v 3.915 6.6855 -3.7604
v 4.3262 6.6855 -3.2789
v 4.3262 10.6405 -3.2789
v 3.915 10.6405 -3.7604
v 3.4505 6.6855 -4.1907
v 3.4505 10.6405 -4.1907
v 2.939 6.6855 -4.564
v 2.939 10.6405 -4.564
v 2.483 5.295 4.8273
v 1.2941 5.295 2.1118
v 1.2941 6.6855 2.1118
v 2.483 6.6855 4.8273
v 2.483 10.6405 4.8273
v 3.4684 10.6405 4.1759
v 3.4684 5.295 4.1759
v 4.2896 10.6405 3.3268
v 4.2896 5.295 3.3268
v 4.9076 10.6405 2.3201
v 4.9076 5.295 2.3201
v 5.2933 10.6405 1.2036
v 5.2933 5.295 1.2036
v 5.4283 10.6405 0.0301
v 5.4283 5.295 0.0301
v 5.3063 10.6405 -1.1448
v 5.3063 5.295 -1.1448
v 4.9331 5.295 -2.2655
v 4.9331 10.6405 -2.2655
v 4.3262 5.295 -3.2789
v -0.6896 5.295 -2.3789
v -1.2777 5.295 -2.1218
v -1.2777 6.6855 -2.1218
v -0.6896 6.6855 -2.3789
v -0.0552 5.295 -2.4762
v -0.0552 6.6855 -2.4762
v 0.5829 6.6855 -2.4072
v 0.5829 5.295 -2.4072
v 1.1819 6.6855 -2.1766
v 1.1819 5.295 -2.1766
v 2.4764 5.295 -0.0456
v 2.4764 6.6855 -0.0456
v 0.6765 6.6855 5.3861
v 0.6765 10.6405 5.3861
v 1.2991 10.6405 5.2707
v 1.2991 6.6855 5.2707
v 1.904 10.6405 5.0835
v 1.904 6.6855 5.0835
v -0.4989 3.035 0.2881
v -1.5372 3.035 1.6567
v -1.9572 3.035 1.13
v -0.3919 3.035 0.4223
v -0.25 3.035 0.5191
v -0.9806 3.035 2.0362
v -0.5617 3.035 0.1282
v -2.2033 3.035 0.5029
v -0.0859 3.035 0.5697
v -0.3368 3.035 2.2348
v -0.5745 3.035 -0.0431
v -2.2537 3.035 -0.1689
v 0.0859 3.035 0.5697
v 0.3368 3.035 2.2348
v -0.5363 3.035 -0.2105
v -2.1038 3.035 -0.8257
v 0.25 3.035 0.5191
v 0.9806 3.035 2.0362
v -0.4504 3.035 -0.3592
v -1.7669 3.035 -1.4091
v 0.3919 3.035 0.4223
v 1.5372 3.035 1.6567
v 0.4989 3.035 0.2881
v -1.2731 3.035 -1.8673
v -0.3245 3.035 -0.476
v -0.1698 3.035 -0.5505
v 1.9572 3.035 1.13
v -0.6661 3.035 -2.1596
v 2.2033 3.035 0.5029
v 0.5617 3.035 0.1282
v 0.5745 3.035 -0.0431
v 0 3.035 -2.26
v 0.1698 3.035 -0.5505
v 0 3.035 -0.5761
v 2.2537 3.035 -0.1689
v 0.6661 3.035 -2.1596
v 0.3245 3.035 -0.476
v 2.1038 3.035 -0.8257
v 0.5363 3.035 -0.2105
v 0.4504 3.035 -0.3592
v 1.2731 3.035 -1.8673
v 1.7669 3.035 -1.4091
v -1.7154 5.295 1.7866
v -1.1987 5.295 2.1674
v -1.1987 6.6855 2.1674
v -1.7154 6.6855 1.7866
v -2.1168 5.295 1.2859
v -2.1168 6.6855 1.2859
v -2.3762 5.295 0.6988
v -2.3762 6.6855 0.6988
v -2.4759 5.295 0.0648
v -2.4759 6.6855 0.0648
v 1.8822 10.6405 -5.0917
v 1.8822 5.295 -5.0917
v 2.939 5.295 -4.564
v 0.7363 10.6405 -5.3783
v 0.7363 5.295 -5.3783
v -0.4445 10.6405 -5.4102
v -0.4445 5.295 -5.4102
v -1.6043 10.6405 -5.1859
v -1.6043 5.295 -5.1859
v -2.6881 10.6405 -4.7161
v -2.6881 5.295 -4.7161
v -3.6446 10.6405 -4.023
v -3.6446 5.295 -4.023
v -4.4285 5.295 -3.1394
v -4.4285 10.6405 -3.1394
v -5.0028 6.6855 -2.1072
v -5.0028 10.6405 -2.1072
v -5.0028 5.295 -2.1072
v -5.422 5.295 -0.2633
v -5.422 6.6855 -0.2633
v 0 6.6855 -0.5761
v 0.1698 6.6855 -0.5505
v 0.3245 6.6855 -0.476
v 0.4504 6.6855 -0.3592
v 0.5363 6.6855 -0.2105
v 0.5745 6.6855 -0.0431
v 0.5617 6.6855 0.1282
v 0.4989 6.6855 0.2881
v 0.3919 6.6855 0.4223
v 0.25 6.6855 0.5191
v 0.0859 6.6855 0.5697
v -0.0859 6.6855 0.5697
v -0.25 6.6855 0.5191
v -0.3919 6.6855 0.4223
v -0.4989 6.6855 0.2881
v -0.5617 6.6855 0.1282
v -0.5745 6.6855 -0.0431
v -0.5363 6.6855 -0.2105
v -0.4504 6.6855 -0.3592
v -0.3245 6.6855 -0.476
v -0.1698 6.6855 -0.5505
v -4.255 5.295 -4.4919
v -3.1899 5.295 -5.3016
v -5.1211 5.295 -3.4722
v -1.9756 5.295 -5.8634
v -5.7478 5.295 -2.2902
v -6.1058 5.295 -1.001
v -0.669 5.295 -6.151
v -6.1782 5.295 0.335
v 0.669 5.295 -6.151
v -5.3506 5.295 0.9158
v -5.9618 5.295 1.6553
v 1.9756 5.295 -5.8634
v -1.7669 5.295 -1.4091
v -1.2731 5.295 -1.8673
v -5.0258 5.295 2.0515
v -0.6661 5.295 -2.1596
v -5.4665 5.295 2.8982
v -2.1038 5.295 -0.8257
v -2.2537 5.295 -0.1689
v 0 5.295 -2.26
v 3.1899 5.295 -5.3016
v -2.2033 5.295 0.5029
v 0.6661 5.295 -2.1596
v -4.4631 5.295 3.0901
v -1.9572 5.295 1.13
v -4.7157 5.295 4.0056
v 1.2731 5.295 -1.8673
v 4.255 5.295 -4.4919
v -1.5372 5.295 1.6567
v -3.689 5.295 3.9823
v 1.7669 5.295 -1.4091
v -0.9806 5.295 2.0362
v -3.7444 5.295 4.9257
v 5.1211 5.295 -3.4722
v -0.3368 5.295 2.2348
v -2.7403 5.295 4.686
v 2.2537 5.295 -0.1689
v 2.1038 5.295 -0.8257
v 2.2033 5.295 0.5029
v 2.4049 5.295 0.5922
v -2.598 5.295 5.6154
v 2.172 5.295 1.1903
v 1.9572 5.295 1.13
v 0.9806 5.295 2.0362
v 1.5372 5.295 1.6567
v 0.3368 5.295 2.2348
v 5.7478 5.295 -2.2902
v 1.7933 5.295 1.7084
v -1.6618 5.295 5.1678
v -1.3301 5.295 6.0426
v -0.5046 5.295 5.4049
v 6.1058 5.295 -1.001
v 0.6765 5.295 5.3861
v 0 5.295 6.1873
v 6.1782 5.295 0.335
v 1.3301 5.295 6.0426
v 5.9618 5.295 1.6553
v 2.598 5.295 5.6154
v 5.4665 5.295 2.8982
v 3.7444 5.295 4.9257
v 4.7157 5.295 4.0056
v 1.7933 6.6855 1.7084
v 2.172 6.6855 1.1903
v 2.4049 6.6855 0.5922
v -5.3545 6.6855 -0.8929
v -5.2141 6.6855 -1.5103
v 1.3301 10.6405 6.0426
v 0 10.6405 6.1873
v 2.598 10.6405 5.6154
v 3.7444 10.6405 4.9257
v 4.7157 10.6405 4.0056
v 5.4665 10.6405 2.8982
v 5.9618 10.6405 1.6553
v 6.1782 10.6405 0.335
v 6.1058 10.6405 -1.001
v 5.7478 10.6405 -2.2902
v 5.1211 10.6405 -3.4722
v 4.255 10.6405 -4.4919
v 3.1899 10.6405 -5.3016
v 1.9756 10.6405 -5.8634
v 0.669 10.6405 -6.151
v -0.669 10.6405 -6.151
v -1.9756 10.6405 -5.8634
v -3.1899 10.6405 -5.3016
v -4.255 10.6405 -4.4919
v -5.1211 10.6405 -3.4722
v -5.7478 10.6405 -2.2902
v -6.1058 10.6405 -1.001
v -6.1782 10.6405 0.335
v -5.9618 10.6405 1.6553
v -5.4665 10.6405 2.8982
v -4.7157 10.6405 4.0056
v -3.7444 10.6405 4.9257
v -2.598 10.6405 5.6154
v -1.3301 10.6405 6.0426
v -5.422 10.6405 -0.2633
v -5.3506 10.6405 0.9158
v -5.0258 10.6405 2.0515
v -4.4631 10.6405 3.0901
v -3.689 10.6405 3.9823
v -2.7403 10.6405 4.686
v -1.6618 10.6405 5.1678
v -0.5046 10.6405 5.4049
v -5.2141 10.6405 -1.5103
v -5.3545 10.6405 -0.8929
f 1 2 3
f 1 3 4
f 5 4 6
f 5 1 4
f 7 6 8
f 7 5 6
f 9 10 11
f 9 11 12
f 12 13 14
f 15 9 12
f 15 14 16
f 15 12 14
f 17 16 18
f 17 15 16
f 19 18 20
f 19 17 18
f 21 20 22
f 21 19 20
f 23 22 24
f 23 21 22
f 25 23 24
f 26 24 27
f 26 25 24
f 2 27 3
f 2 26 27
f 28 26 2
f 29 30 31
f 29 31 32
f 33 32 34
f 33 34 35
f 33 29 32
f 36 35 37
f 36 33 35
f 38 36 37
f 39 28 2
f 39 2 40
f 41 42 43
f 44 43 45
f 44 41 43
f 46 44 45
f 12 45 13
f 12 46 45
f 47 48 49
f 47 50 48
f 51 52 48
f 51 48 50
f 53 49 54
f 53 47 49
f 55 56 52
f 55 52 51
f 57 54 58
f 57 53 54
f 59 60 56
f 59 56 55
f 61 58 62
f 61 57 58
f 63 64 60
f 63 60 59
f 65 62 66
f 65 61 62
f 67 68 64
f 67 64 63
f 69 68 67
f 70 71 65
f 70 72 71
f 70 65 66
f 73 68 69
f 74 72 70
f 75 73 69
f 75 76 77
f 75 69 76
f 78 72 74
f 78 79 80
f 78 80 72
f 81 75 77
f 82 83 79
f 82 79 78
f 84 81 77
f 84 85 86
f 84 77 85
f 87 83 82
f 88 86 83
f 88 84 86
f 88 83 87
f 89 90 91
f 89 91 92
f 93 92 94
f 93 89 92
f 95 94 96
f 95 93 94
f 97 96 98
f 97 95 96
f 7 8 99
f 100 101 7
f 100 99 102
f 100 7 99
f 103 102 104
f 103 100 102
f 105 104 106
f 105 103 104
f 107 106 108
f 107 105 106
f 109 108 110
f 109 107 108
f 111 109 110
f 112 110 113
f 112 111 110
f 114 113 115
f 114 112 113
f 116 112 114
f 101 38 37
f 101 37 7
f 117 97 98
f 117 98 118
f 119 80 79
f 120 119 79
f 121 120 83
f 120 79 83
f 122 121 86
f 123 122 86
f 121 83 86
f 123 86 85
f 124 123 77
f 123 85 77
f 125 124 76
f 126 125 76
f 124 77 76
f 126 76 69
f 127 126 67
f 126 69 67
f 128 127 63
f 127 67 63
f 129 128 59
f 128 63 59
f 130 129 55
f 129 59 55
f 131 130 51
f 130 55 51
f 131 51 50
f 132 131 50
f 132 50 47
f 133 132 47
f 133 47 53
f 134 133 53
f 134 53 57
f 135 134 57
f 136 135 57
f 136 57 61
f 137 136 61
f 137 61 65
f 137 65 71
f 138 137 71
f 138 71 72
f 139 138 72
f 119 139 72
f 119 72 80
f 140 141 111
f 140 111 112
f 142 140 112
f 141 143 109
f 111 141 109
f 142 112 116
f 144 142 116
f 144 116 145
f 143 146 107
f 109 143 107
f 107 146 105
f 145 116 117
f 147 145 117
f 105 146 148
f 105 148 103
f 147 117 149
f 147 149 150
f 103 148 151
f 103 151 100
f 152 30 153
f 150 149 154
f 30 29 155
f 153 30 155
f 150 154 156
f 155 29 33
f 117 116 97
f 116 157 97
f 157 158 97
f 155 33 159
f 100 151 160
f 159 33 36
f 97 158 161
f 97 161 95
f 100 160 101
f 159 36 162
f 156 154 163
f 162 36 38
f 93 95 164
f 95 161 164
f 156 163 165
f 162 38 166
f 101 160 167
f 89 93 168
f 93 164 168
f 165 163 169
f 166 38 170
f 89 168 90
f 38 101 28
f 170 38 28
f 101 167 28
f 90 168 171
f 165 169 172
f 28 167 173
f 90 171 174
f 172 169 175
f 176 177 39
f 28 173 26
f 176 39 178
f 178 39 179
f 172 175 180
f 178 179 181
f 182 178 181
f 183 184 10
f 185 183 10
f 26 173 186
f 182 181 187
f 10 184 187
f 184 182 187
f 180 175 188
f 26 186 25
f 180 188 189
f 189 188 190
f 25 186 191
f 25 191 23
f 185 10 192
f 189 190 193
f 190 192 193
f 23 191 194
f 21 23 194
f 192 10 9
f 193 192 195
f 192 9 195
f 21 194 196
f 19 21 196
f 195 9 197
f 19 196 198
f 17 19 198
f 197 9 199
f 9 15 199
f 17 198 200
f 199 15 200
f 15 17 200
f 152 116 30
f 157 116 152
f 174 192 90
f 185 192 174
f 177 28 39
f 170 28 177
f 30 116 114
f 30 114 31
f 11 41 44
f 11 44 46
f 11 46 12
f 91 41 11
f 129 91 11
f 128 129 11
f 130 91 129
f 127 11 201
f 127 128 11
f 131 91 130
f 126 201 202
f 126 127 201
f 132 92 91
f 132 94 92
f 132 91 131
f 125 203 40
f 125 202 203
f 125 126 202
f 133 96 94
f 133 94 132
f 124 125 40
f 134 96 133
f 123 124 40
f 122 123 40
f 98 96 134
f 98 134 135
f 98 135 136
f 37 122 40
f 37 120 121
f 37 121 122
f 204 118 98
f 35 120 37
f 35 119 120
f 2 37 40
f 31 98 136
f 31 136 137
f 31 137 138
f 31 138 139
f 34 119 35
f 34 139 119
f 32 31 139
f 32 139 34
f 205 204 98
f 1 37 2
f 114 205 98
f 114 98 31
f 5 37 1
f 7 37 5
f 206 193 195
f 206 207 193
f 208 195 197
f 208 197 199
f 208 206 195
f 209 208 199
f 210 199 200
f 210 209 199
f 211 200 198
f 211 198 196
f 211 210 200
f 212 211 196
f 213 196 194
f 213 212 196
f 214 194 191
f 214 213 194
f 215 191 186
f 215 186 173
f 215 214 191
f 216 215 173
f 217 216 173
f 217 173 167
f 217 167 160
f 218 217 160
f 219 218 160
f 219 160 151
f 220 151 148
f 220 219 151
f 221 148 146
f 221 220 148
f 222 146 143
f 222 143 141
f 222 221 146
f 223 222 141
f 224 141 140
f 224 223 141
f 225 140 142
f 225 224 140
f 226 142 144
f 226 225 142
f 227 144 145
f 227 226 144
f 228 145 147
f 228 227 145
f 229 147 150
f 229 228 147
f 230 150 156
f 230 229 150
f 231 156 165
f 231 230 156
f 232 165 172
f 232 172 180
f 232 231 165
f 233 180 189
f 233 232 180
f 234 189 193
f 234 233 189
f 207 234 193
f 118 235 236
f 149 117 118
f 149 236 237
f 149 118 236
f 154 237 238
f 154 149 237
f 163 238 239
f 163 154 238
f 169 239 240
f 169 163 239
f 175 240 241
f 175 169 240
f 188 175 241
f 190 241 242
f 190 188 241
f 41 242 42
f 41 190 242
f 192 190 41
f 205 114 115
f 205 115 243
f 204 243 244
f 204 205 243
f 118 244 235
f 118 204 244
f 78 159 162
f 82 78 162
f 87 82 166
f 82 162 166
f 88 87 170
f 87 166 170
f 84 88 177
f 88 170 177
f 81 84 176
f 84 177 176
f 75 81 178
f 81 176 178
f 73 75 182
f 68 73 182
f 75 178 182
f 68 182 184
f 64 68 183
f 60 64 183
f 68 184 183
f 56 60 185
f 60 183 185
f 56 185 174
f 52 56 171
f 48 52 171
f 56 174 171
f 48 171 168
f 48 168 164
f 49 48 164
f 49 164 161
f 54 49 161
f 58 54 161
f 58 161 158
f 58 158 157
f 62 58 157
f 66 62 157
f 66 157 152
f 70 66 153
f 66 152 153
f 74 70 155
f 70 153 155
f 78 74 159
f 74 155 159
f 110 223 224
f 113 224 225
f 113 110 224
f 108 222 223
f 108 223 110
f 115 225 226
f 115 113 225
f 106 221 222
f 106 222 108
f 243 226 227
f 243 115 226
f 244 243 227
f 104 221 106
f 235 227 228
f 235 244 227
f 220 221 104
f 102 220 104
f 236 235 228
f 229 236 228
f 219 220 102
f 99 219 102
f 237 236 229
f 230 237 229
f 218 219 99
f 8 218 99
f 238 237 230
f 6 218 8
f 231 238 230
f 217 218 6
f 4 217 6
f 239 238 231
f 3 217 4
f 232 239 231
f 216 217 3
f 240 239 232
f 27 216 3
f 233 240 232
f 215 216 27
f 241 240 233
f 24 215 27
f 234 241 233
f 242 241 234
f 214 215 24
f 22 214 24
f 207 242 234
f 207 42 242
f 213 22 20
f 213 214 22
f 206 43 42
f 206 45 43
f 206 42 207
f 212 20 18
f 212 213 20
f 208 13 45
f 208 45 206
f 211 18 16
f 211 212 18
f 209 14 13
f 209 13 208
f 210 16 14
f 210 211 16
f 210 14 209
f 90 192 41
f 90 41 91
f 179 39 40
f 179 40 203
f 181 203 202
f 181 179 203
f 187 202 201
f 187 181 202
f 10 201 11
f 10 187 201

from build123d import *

# Parameters (mm, degrees)
CROQUIS1_W              = 10.950949918
CROQUIS1_H              = 9.461001059
CROQUIS2_R              = 4
SALIENTE_EXTRUIR1_DEPTH = 4
CORTAR_EXTRUIR1_DEPTH   = 10
MATRIZC1_COUNT          = 3
CORTAR_EXTRUIR2_START   = -7
CROQUIS8_R              = 9.607815028
CORTAR_EXTRUIR2_DEPTH   = 7
CROQUIS9_R              = 1.019703071
CORTAR_EXTRUIR3_DEPTH   = 21.519384926
ESCALA1_SCALE           = 0.565


with BuildPart() as part:
    # Croquis1 → Revolución1 (revolve)
    with BuildSketch(Plane(origin=(0, 0, 0), x_dir=(-1, 0, 0), z_dir=(0, 0, -1)), mode=Mode.PRIVATE) as revoluci_n1_sk:
        with Locations((-5.475474959, 8.73050053)):
            Rectangle(CROQUIS1_W, CROQUIS1_H)
    revolve(revoluci_n1_sk.sketch.rotate(Axis((0, 4, 0), (0, 1, 0)), 270), axis=Axis((0, 4, 0), (0, 1, 0)))

    # Croquis2 → Saliente-Extruir1 (add)
    with BuildSketch(Plane.XZ.offset(-4)):
        with Locations(Location((0, 0, 0), (0, 0, 270))):
            Circle(CROQUIS2_R)
    extrude(amount=SALIENTE_EXTRUIR1_DEPTH)

    # Croquis7 → Cortar-Extruir1 (cut)
    with BuildSketch(Plane.XZ.offset(-4)):
        with BuildLine():
            Line((2.290412928, 3.737743004), (4.394709568, 8.543806963))
            ThreePointArc((4.394709568, 8.543806963), (9.368666462, 2.13030475), (7.657065469, -5.803400555))
            Line((7.657065469, -5.803400555), (4.382944907, -0.080672706))
            ThreePointArc((4.382944907, -0.080672706), (3.844281576, 2.106706746), (2.290412928, 3.737743004))
        make_face()
    cortar_extruir1 = extrude(amount=-CORTAR_EXTRUIR1_DEPTH, mode=Mode.SUBTRACT)

    # MatrizC1: Cortar-Extruir1 ×3 about axis
    matrizc1_axis = Axis((0, 0, 0), (0, 1, 0))
    for i in range(1, MATRIZC1_COUNT):
        add(cortar_extruir1.rotate(matrizc1_axis, i * 360 / MATRIZC1_COUNT), mode=Mode.SUBTRACT)

    # Croquis8 → Cortar-Extruir2 (cut)
    with BuildSketch(Plane(origin=(0, 13.461001059, 0), x_dir=(1, 0, 0), z_dir=(0, 1, 0)).offset(CORTAR_EXTRUIR2_START)):
        with Locations(Location((0, 0, 0), (0, 0, 57.220098004))):
            Circle(CROQUIS8_R)
    extrude(amount=CORTAR_EXTRUIR2_DEPTH, mode=Mode.SUBTRACT)

    # Croquis9 → Cortar-Extruir3 (cut, through all)
    with BuildSketch(Plane.XZ):
        with Locations(Location((0, 0, 0), (0, 0, 270))):
            Circle(CROQUIS9_R)
    extrude(amount=-CORTAR_EXTRUIR3_DEPTH, mode=Mode.SUBTRACT)


with BuildPart() as part_1:
    # Escala1: scaled about (0, 6.977093027, 0)
    add(part.part.scale(ESCALA1_SCALE).moved(Location((0, 3.035035467, 0))))


solid = part_1.part
